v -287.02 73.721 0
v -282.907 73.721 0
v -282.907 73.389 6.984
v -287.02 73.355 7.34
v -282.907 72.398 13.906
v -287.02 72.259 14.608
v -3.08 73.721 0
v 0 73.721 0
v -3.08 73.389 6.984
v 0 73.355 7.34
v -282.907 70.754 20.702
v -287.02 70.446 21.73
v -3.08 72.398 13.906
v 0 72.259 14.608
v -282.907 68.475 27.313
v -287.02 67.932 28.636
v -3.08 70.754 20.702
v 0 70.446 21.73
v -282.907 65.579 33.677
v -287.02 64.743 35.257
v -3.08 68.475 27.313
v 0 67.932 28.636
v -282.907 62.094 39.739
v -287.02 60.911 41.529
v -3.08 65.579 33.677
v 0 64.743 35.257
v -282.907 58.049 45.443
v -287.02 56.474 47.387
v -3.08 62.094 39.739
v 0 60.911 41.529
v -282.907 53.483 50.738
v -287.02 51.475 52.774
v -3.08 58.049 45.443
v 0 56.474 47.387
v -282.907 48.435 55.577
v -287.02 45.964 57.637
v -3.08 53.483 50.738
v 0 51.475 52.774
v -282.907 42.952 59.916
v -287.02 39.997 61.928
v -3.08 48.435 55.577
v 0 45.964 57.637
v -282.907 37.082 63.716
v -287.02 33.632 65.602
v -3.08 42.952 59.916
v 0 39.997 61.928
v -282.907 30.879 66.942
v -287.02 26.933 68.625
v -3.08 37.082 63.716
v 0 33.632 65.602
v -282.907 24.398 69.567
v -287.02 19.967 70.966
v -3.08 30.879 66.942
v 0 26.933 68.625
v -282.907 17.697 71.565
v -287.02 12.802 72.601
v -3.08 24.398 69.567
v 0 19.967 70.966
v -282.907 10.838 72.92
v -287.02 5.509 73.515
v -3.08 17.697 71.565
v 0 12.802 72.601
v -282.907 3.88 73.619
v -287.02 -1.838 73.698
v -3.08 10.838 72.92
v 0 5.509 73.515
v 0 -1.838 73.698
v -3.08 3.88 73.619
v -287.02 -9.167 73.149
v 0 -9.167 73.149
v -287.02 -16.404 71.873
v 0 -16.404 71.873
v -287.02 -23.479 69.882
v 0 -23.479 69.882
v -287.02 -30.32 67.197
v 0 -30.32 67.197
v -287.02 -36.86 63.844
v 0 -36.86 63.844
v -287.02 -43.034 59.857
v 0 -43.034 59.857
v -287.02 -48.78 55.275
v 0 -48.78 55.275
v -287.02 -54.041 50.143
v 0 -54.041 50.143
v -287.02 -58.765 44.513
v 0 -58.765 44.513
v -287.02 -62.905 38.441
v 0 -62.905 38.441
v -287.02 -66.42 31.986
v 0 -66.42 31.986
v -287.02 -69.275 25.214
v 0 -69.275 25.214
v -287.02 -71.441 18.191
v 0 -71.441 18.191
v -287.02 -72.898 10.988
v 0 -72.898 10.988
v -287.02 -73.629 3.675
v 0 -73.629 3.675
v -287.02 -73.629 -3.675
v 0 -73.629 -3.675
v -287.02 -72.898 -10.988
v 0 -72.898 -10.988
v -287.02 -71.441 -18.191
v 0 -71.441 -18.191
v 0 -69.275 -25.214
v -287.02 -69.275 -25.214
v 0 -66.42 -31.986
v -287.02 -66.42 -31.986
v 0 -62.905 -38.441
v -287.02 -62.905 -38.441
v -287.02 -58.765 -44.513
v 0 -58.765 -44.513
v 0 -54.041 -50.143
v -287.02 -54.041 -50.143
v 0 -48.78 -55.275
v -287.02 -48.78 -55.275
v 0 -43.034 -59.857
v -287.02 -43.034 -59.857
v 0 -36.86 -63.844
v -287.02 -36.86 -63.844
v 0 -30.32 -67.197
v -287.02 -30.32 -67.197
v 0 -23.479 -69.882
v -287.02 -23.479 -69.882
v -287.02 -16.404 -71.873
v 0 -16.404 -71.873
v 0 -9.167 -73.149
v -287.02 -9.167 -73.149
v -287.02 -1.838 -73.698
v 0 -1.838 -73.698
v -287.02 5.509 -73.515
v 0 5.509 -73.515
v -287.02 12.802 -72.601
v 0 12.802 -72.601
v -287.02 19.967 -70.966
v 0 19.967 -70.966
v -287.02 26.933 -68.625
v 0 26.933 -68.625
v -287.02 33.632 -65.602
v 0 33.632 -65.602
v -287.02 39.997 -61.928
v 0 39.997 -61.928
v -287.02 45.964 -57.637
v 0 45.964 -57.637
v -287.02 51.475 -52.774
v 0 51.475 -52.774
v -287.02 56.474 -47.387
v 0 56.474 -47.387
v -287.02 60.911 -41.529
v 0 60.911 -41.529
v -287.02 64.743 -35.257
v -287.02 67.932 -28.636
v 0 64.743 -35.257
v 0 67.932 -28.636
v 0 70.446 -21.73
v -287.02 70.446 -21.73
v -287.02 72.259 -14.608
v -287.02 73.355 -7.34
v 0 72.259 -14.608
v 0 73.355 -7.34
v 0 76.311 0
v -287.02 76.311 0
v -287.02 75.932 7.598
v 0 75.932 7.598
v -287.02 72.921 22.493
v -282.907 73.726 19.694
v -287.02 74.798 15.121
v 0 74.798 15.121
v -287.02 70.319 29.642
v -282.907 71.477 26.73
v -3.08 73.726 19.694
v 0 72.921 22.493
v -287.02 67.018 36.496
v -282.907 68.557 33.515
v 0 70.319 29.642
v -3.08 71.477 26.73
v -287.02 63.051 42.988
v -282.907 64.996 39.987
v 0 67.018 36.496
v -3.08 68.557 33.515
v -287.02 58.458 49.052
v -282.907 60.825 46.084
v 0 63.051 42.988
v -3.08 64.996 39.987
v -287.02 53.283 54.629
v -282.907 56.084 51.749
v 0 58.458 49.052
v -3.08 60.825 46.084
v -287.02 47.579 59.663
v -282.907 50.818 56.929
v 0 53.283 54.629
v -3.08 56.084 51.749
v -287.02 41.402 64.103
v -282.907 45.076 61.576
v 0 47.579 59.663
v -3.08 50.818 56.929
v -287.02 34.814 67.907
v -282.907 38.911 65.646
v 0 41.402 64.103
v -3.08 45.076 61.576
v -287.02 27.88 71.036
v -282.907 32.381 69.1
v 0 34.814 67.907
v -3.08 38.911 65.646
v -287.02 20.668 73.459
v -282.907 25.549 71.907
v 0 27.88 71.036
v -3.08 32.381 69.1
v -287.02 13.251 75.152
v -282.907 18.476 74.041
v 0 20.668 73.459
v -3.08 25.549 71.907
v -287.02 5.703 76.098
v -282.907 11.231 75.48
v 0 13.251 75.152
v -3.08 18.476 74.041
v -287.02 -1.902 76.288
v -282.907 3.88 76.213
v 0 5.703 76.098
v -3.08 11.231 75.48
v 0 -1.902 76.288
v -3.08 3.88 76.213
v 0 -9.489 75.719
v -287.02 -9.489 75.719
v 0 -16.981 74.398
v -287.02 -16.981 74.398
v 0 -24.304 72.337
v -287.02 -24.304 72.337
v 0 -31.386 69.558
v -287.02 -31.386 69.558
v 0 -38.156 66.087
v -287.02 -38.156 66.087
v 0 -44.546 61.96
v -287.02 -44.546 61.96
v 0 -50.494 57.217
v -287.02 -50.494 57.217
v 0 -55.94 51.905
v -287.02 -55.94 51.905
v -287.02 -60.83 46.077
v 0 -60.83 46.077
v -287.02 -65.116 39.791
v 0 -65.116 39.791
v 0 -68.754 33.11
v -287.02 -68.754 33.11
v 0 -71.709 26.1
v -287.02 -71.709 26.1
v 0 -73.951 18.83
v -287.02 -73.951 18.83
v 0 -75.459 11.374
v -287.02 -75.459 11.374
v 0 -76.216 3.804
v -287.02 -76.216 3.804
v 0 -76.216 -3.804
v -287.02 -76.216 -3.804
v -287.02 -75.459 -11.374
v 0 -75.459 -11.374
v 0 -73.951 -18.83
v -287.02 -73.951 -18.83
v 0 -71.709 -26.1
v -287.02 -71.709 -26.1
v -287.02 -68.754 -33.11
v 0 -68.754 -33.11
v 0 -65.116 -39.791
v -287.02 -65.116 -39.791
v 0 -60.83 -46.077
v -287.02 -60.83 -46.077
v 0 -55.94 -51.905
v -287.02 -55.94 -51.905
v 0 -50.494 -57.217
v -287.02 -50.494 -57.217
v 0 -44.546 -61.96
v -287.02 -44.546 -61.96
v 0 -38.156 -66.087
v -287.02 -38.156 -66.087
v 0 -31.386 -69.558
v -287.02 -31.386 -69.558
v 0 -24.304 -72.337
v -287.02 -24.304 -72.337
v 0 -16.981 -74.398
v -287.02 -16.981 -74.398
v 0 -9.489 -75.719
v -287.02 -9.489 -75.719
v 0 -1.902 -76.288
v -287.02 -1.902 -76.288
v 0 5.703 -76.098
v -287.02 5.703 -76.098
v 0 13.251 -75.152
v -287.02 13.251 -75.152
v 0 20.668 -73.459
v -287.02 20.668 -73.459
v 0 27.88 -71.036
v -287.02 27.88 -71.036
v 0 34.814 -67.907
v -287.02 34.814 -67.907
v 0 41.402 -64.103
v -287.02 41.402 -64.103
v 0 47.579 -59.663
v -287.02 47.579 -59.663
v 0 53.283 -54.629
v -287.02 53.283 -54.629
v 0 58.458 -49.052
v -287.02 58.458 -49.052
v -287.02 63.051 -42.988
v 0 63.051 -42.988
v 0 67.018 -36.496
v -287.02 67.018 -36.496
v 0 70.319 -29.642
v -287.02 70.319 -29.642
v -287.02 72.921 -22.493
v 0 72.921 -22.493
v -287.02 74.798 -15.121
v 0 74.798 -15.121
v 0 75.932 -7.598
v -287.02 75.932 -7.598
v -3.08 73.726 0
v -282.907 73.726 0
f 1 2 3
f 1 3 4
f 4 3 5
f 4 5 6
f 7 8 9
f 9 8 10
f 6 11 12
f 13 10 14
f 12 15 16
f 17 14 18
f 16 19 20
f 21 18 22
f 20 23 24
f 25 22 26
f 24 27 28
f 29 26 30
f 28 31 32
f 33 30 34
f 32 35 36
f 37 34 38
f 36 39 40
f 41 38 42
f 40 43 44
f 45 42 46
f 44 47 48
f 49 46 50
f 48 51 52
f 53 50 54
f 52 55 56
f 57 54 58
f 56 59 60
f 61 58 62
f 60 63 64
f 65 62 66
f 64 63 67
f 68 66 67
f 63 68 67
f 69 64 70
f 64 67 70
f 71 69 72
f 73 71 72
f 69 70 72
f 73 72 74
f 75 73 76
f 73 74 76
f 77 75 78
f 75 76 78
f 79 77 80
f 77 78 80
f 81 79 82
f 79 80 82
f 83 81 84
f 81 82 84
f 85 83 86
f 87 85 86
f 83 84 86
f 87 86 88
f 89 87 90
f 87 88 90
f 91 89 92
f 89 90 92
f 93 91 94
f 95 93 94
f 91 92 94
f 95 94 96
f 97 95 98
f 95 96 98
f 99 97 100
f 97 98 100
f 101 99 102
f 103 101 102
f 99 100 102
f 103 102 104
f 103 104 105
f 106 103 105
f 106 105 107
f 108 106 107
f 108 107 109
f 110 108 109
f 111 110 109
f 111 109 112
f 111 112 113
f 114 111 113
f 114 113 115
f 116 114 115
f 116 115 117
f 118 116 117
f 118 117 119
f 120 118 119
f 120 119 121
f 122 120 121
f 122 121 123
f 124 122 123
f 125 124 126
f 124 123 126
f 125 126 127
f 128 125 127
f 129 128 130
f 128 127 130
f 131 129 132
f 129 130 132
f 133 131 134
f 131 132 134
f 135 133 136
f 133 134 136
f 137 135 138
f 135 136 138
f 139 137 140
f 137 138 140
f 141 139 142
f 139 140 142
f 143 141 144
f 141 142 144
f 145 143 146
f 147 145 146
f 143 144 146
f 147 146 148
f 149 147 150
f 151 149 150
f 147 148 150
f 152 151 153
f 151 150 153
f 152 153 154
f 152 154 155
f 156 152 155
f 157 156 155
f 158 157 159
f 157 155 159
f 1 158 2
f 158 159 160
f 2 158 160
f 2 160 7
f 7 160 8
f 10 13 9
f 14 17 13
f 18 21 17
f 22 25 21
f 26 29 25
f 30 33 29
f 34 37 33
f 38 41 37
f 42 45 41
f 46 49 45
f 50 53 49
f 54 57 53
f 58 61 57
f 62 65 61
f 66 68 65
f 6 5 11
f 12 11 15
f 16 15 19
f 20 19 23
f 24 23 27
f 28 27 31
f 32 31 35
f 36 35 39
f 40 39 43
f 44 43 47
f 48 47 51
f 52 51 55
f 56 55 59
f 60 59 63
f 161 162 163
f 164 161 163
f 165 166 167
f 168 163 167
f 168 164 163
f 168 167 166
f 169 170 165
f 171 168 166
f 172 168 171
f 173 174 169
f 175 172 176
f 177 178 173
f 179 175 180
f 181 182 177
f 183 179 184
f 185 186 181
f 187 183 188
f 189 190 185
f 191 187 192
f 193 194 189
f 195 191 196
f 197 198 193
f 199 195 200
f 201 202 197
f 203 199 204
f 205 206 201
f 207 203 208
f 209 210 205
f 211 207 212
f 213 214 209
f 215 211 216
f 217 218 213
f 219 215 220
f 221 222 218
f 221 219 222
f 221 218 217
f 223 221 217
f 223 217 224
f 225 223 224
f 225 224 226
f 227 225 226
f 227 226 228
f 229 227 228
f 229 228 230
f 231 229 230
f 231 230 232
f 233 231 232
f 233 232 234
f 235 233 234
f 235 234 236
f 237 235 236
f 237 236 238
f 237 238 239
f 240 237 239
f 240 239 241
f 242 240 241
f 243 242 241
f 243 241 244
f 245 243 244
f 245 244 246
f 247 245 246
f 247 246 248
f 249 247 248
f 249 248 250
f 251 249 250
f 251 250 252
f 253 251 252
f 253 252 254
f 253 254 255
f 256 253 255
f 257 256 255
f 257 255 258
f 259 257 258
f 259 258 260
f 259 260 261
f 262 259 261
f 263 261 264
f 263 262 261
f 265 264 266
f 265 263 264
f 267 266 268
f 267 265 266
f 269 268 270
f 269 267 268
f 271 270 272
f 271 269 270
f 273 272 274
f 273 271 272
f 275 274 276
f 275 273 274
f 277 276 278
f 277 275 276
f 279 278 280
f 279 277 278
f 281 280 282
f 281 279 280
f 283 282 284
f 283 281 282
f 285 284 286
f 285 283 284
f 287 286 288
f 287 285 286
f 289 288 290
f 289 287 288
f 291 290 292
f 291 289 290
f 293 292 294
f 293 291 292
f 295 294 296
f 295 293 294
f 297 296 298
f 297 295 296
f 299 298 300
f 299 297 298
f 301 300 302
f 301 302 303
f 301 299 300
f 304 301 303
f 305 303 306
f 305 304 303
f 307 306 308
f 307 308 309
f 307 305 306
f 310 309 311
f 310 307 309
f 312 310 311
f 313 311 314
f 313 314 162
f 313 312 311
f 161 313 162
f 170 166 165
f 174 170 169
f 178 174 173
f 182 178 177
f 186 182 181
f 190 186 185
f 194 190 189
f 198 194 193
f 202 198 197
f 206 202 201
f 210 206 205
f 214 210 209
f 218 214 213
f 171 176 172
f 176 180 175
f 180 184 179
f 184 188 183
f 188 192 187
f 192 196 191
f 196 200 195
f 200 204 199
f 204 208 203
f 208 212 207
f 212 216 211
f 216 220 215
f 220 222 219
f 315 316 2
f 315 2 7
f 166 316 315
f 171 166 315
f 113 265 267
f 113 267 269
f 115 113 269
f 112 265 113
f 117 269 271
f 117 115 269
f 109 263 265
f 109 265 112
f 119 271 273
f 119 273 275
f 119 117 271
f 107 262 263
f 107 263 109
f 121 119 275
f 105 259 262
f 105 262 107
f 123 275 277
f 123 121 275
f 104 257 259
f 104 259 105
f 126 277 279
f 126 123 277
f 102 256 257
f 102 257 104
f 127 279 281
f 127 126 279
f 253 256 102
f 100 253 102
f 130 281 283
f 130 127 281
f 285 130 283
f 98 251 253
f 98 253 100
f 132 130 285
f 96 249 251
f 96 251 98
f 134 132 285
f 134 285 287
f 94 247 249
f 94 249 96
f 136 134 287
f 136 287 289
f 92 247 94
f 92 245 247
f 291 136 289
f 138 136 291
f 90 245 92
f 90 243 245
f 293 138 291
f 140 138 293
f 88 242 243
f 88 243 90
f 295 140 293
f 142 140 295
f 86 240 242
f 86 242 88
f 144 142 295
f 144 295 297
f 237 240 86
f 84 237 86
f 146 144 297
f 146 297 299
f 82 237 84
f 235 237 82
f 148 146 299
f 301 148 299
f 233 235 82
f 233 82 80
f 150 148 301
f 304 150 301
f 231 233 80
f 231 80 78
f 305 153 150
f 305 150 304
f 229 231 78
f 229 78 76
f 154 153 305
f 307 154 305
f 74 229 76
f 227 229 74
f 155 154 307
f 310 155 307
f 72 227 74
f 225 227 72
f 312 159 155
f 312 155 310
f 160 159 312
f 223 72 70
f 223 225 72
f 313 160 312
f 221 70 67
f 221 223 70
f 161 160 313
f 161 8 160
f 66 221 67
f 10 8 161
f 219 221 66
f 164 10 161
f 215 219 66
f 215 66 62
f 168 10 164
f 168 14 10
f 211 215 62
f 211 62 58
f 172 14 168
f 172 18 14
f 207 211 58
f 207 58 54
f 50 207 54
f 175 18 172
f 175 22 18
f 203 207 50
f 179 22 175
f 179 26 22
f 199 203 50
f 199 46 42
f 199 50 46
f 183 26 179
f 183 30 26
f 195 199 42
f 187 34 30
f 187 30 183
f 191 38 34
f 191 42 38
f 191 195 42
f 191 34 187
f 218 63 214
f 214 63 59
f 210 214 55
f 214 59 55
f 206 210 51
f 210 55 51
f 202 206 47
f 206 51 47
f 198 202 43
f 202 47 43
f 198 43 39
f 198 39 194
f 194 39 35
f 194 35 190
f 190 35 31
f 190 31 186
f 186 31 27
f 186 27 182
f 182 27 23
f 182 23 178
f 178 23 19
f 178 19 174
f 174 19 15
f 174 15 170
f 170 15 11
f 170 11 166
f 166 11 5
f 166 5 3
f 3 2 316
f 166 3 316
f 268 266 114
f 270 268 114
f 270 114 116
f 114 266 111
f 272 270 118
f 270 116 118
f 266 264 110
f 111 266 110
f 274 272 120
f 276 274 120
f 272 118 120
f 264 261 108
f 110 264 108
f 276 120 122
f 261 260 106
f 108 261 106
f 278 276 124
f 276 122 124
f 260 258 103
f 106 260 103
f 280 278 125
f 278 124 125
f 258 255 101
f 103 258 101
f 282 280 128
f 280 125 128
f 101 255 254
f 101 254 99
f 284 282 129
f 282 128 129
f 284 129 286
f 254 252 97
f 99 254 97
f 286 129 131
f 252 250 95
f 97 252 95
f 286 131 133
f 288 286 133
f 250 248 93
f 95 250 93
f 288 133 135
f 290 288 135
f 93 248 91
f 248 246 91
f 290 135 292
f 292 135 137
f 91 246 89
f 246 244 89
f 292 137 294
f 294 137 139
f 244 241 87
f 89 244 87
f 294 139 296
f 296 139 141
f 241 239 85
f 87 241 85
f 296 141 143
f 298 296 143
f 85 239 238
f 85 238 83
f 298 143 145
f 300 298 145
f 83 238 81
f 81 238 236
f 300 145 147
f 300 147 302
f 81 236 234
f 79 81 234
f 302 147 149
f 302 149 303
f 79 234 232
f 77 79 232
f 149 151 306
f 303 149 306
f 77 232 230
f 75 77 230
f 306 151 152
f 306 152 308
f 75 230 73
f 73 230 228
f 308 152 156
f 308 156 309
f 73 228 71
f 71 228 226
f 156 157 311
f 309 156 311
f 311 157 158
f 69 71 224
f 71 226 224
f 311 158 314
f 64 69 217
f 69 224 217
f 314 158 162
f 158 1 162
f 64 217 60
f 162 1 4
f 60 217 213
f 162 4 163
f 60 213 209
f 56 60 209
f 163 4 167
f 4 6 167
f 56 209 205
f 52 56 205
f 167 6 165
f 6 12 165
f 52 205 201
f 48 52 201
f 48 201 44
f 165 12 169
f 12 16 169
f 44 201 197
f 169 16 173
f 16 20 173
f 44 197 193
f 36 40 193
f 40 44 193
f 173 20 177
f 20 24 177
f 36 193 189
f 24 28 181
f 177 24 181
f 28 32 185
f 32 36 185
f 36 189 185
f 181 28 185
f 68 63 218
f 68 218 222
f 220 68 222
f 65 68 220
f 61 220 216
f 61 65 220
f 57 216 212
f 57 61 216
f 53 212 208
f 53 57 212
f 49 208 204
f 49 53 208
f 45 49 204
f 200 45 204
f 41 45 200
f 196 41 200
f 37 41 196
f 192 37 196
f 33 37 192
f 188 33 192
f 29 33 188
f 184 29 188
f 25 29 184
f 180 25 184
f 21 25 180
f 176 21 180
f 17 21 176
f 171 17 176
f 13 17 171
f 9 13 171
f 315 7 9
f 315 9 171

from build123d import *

# Parameters (mm, degrees)
F0_R     = 76.311226
F1_DEPTH = 287.02
F2_R     = 73.720997
F3_DEPTH = 1714.5
F4_W     = 279.827215
F4_H     = 69.845937
F5_DEPTH = 122.428


with BuildPart() as f1:
    # F0 (on Right) → F1 (new body)
    with BuildSketch(Plane.YZ):
        Circle(F0_R)
    extrude(amount=-F1_DEPTH)

    # F2 (on Right) → F3 (cut)
    with BuildSketch(Plane.YZ):
        Circle(F2_R)
    extrude(amount=-F3_DEPTH, mode=Mode.SUBTRACT)

    # F4 (on Top) → F5 (cut)
    with BuildSketch(Plane.XY):
        with Locations((-142.993759, 38.803298)):
            Rectangle(F4_W, F4_H)
    extrude(amount=F5_DEPTH, mode=Mode.SUBTRACT)


solid = f1.part
